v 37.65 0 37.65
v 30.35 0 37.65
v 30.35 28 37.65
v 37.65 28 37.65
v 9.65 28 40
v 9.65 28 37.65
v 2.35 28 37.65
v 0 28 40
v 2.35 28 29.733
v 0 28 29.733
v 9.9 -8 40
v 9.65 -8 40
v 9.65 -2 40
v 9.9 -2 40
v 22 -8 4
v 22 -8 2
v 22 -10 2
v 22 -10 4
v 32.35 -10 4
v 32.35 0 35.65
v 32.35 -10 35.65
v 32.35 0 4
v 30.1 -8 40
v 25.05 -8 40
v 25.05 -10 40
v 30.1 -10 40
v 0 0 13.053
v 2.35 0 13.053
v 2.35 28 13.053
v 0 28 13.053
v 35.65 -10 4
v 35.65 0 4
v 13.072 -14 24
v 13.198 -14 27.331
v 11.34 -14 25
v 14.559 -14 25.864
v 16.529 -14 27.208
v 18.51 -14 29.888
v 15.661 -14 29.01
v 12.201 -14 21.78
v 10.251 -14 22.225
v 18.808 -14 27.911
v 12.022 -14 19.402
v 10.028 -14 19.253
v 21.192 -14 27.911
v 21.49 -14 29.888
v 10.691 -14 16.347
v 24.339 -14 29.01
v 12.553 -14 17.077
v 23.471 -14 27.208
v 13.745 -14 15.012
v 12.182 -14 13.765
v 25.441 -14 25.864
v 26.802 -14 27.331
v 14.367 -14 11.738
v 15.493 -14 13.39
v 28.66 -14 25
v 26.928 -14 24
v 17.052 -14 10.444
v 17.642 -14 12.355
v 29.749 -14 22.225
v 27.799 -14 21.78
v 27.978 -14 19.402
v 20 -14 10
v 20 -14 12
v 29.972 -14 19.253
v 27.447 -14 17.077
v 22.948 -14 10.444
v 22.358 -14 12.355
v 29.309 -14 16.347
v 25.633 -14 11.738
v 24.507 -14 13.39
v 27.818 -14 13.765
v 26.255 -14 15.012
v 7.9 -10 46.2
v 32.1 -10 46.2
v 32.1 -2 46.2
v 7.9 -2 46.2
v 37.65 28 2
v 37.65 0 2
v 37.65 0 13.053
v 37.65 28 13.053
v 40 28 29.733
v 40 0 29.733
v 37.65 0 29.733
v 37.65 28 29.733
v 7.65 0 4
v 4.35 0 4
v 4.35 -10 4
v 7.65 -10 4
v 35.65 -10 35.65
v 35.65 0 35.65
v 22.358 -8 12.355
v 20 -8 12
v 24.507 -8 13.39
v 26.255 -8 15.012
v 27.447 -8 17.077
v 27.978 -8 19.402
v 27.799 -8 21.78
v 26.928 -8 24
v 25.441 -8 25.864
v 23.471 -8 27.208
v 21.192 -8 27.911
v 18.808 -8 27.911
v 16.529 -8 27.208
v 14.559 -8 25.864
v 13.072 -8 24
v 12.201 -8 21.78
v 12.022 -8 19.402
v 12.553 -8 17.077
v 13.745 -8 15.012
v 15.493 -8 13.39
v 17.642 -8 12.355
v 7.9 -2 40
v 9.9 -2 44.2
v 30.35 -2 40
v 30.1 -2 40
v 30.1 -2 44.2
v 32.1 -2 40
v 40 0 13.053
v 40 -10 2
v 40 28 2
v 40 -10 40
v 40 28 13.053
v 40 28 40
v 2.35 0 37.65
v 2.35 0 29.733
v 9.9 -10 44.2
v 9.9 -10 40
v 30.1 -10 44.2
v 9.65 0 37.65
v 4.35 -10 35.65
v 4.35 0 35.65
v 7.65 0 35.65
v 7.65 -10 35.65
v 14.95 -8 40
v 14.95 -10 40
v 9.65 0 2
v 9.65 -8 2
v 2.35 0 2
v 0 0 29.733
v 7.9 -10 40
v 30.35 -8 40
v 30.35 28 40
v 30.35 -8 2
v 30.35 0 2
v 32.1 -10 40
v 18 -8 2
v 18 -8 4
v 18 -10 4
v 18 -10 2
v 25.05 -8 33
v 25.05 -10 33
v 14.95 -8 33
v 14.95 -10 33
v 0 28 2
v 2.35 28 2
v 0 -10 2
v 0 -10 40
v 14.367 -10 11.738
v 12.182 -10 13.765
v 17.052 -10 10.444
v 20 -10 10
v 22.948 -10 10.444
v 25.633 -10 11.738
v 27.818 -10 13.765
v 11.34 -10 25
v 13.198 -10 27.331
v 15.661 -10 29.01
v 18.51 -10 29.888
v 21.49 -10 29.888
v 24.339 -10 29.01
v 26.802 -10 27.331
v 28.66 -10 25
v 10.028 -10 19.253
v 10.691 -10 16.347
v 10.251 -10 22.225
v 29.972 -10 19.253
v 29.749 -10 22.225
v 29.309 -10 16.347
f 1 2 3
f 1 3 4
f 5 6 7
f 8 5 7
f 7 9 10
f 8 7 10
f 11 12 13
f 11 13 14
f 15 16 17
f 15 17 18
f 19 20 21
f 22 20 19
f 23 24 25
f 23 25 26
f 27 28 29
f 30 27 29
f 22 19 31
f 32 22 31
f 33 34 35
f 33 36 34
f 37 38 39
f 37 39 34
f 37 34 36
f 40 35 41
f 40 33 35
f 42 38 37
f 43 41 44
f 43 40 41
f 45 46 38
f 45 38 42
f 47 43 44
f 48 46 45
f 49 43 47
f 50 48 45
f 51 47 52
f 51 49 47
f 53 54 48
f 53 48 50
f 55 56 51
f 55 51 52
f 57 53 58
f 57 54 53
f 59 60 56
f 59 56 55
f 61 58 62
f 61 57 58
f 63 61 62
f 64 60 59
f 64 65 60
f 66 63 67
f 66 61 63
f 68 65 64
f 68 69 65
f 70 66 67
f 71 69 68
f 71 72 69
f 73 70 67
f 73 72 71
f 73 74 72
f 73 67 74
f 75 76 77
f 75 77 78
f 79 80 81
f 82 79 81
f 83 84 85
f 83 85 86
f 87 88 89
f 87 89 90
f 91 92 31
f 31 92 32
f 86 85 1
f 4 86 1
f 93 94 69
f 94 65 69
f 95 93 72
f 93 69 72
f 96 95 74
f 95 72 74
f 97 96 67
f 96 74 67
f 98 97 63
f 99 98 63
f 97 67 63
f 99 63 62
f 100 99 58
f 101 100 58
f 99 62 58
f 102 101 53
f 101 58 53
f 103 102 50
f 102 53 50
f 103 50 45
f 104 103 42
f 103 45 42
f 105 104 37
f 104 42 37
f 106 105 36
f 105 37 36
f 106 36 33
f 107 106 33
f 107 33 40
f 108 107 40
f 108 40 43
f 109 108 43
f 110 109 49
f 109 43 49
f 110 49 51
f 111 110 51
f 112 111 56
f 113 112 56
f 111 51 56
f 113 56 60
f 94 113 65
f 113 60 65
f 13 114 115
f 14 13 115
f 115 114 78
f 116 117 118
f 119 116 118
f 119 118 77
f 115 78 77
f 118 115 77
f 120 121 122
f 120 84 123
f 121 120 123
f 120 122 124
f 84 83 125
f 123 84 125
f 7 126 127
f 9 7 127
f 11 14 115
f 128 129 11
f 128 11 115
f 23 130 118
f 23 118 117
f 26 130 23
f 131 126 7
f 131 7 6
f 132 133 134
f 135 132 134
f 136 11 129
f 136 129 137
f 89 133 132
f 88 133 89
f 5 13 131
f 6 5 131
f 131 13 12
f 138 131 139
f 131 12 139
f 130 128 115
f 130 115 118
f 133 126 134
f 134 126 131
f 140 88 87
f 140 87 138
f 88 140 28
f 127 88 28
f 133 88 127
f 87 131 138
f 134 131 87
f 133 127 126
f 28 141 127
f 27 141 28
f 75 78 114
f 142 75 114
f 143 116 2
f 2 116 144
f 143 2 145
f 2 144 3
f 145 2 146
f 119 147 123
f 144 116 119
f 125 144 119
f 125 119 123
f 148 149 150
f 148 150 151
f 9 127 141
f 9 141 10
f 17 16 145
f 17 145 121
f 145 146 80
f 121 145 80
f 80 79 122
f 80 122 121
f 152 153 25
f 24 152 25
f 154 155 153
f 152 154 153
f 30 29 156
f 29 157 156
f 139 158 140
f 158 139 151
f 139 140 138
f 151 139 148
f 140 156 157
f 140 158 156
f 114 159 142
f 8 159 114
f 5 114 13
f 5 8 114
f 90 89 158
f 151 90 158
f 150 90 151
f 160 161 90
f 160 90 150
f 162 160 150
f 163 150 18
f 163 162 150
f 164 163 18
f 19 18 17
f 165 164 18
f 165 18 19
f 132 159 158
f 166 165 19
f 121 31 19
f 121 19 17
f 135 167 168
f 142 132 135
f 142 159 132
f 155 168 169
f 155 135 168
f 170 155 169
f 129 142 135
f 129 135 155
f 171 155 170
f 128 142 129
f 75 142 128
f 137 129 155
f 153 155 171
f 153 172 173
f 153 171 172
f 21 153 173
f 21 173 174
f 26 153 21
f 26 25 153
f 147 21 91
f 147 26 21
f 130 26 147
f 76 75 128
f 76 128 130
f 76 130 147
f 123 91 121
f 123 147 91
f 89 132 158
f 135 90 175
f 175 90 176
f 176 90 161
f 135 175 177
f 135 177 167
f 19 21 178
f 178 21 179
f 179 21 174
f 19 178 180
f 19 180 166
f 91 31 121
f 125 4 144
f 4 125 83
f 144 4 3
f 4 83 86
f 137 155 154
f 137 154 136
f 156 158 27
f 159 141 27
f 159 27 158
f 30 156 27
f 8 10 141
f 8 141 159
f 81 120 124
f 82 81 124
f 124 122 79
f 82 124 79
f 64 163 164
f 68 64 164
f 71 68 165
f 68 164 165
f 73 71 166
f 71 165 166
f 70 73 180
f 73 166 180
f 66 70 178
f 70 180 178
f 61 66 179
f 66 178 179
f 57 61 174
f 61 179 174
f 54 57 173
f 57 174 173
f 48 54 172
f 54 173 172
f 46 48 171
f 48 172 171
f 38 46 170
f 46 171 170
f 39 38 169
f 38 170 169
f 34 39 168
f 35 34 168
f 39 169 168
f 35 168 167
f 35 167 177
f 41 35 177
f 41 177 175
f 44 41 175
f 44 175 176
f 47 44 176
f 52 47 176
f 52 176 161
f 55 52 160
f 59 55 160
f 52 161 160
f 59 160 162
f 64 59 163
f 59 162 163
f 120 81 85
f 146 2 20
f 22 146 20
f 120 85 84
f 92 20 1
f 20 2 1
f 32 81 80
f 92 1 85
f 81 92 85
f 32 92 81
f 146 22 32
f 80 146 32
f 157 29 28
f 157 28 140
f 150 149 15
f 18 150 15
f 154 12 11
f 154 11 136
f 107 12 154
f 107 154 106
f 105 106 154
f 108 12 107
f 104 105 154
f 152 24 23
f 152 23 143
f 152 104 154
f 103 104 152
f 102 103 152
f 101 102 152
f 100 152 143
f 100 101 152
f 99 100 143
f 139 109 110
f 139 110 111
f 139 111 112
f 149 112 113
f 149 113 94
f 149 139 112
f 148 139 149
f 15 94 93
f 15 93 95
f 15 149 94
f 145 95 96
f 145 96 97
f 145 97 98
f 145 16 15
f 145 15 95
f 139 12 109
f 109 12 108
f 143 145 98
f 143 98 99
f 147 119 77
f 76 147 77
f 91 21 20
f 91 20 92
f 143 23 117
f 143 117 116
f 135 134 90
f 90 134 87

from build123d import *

# Parameters (mm, degrees)
BOSS_EXTRUDE2_DEPTH = 28
SKETCH3_W           = 40
SKETCH3_H           = 38
BOSS_EXTRUDE3_DEPTH = 10
CUT_EXTRUDE2_DEPTH  = 8
SKETCH6_W           = 20.7
SKETCH6_H           = 38
CUT_EXTRUDE3_DEPTH  = 43
CUT_EXTRUDE4_DEPTH  = 43
BOSS_EXTRUDE5_DEPTH = 8
SKETCH10_R          = 10
BOSS_EXTRUDE6_DEPTH = 4
SKETCH11_R          = 8
CUT_EXTRUDE5_DEPTH  = 4
SKETCH12_R          = 8
CUT_EXTRUDE6_DEPTH  = 10
SKETCH13_W          = 3.3
SKETCH13_H          = 31.65
CUT_EXTRUDE7_DEPTH  = 10
SKETCH14_W          = 3.3
SKETCH14_H          = 31.65
CUT_EXTRUDE8_DEPTH  = 10
SKETCH15_W          = 16.679991472
SKETCH15_H          = 28
CUT_EXTRUDE9_DEPTH  = 253
SKETCH16_W          = 10.1
SKETCH16_H          = 7
CUT_EXTRUDE11_DEPTH = 13


with BuildPart() as part:
    # Sketch1 → Boss-Extrude2 (new body)
    with BuildSketch(Plane(origin=(0, 0, 0), x_dir=(1, 0, 0), z_dir=(0, 1, 0))):
        Polygon((40, -2), (40, -40), (0, -40), (0, -2), (2.35, -2), (2.35, -2.35), (2.35, -20), (2.35, -37.65), (37.65, -37.65), (37.65, -20), (37.65, -2.35), (37.65, -2), align=None)
    extrude(amount=BOSS_EXTRUDE2_DEPTH)

    # Sketch3 → Boss-Extrude3 (add)
    with BuildSketch(Plane.XZ):
        with Locations((20, 21)):
            Rectangle(SKETCH3_W, SKETCH3_H)
    extrude(amount=BOSS_EXTRUDE3_DEPTH)

    # Sketch5 → Cut-Extrude2 (cut)
    with BuildSketch(Plane(origin=(0, 0, 0), x_dir=(1, 0, 0), z_dir=(0, 1, 0))):
        Polygon((9.65, -20), (9.65, -57.9), (20, -57.9), (30.35, -57.9), (30.35, -20), (30.35, -2), (9.65, -2), align=None)
    extrude(amount=-CUT_EXTRUDE2_DEPTH, mode=Mode.SUBTRACT)

    # Sketch6 → Cut-Extrude3 (cut)
    with BuildSketch(Plane(origin=(0, -8, 0), x_dir=(1, 0, 0), z_dir=(0, 1, 0))):
        with Locations((20, -21)):
            Rectangle(SKETCH6_W, SKETCH6_H)
    extrude(amount=CUT_EXTRUDE3_DEPTH, mode=Mode.SUBTRACT)

    # Sketch7 → Cut-Extrude4 (cut)
    with BuildSketch(Plane(origin=(0, -8, 0), x_dir=(1, 0, 0), z_dir=(0, 1, 0))):
        Polygon((20, -4), (18, -4), (18, -2), (22, -2), (22, -4), align=None)
    extrude(amount=-CUT_EXTRUDE4_DEPTH, mode=Mode.SUBTRACT)

    # Sketch9 → Boss-Extrude5 (add)
    with BuildSketch(Plane.XZ.offset(10)):
        Polygon((30.1, 44.2), (30.1, 40), (32.1, 40), (32.1, 46.2), (18, 46.2), (9.9, 46.2), (7.9, 46.2), (7.9, 40), (9.9, 40), (9.9, 44.2), align=None)
    extrude(amount=-BOSS_EXTRUDE5_DEPTH)

    # Sketch10 → Boss-Extrude6 (add)
    with BuildSketch(Plane.XZ.offset(10)):
        with Locations(Location((20, 20, 0), (0, 0, 270))):
            Circle(SKETCH10_R)
    extrude(amount=BOSS_EXTRUDE6_DEPTH)

    # Sketch11 → Cut-Extrude5 (cut)
    with BuildSketch(Plane(origin=(0, -14, 0), x_dir=(-1, 0, 0), z_dir=(0, -1, 0))):
        with Locations(Location((-20, -20, 0), (0, 0, 90))):
            Circle(SKETCH11_R)
    extrude(amount=-CUT_EXTRUDE5_DEPTH, mode=Mode.SUBTRACT)

    # Sketch12 → Cut-Extrude6 (cut)
    with BuildSketch(Plane.XZ.offset(10)):
        with Locations(Location((20, 20, 0), (0, 0, 270))):
            Circle(SKETCH12_R)
    extrude(amount=-CUT_EXTRUDE6_DEPTH, mode=Mode.SUBTRACT)

    # Sketch13 → Cut-Extrude7 (cut)
    with BuildSketch(Plane(origin=(0, 0, 0), x_dir=(1, 0, 0), z_dir=(0, 1, 0))):
        with Locations((6, -19.825)):
            Rectangle(SKETCH13_W, SKETCH13_H)
    extrude(amount=-CUT_EXTRUDE7_DEPTH, mode=Mode.SUBTRACT)

    # Sketch14 → Cut-Extrude8 (cut)
    with BuildSketch(Plane(origin=(0, 0, 0), x_dir=(1, 0, 0), z_dir=(0, 1, 0))):
        with Locations((34, -19.825)):
            Rectangle(SKETCH14_W, SKETCH14_H)
    extrude(amount=-CUT_EXTRUDE8_DEPTH, mode=Mode.SUBTRACT)

    # Sketch15 → Cut-Extrude9 (cut)
    with BuildSketch(Plane(origin=(40, 0, 0), x_dir=(0, 0, -1), z_dir=(1, 0, 0))):
        with Locations((-21.392853586, 14)):
            Rectangle(SKETCH15_W, SKETCH15_H)
    extrude(amount=-CUT_EXTRUDE9_DEPTH, mode=Mode.SUBTRACT)

    # Sketch16 → Cut-Extrude11 (cut)
    with BuildSketch(Plane.XZ.offset(10)):
        with Locations((20, 36.5)):
            Rectangle(SKETCH16_W, SKETCH16_H)
    extrude(amount=-CUT_EXTRUDE11_DEPTH, mode=Mode.SUBTRACT)


solid = part.part
